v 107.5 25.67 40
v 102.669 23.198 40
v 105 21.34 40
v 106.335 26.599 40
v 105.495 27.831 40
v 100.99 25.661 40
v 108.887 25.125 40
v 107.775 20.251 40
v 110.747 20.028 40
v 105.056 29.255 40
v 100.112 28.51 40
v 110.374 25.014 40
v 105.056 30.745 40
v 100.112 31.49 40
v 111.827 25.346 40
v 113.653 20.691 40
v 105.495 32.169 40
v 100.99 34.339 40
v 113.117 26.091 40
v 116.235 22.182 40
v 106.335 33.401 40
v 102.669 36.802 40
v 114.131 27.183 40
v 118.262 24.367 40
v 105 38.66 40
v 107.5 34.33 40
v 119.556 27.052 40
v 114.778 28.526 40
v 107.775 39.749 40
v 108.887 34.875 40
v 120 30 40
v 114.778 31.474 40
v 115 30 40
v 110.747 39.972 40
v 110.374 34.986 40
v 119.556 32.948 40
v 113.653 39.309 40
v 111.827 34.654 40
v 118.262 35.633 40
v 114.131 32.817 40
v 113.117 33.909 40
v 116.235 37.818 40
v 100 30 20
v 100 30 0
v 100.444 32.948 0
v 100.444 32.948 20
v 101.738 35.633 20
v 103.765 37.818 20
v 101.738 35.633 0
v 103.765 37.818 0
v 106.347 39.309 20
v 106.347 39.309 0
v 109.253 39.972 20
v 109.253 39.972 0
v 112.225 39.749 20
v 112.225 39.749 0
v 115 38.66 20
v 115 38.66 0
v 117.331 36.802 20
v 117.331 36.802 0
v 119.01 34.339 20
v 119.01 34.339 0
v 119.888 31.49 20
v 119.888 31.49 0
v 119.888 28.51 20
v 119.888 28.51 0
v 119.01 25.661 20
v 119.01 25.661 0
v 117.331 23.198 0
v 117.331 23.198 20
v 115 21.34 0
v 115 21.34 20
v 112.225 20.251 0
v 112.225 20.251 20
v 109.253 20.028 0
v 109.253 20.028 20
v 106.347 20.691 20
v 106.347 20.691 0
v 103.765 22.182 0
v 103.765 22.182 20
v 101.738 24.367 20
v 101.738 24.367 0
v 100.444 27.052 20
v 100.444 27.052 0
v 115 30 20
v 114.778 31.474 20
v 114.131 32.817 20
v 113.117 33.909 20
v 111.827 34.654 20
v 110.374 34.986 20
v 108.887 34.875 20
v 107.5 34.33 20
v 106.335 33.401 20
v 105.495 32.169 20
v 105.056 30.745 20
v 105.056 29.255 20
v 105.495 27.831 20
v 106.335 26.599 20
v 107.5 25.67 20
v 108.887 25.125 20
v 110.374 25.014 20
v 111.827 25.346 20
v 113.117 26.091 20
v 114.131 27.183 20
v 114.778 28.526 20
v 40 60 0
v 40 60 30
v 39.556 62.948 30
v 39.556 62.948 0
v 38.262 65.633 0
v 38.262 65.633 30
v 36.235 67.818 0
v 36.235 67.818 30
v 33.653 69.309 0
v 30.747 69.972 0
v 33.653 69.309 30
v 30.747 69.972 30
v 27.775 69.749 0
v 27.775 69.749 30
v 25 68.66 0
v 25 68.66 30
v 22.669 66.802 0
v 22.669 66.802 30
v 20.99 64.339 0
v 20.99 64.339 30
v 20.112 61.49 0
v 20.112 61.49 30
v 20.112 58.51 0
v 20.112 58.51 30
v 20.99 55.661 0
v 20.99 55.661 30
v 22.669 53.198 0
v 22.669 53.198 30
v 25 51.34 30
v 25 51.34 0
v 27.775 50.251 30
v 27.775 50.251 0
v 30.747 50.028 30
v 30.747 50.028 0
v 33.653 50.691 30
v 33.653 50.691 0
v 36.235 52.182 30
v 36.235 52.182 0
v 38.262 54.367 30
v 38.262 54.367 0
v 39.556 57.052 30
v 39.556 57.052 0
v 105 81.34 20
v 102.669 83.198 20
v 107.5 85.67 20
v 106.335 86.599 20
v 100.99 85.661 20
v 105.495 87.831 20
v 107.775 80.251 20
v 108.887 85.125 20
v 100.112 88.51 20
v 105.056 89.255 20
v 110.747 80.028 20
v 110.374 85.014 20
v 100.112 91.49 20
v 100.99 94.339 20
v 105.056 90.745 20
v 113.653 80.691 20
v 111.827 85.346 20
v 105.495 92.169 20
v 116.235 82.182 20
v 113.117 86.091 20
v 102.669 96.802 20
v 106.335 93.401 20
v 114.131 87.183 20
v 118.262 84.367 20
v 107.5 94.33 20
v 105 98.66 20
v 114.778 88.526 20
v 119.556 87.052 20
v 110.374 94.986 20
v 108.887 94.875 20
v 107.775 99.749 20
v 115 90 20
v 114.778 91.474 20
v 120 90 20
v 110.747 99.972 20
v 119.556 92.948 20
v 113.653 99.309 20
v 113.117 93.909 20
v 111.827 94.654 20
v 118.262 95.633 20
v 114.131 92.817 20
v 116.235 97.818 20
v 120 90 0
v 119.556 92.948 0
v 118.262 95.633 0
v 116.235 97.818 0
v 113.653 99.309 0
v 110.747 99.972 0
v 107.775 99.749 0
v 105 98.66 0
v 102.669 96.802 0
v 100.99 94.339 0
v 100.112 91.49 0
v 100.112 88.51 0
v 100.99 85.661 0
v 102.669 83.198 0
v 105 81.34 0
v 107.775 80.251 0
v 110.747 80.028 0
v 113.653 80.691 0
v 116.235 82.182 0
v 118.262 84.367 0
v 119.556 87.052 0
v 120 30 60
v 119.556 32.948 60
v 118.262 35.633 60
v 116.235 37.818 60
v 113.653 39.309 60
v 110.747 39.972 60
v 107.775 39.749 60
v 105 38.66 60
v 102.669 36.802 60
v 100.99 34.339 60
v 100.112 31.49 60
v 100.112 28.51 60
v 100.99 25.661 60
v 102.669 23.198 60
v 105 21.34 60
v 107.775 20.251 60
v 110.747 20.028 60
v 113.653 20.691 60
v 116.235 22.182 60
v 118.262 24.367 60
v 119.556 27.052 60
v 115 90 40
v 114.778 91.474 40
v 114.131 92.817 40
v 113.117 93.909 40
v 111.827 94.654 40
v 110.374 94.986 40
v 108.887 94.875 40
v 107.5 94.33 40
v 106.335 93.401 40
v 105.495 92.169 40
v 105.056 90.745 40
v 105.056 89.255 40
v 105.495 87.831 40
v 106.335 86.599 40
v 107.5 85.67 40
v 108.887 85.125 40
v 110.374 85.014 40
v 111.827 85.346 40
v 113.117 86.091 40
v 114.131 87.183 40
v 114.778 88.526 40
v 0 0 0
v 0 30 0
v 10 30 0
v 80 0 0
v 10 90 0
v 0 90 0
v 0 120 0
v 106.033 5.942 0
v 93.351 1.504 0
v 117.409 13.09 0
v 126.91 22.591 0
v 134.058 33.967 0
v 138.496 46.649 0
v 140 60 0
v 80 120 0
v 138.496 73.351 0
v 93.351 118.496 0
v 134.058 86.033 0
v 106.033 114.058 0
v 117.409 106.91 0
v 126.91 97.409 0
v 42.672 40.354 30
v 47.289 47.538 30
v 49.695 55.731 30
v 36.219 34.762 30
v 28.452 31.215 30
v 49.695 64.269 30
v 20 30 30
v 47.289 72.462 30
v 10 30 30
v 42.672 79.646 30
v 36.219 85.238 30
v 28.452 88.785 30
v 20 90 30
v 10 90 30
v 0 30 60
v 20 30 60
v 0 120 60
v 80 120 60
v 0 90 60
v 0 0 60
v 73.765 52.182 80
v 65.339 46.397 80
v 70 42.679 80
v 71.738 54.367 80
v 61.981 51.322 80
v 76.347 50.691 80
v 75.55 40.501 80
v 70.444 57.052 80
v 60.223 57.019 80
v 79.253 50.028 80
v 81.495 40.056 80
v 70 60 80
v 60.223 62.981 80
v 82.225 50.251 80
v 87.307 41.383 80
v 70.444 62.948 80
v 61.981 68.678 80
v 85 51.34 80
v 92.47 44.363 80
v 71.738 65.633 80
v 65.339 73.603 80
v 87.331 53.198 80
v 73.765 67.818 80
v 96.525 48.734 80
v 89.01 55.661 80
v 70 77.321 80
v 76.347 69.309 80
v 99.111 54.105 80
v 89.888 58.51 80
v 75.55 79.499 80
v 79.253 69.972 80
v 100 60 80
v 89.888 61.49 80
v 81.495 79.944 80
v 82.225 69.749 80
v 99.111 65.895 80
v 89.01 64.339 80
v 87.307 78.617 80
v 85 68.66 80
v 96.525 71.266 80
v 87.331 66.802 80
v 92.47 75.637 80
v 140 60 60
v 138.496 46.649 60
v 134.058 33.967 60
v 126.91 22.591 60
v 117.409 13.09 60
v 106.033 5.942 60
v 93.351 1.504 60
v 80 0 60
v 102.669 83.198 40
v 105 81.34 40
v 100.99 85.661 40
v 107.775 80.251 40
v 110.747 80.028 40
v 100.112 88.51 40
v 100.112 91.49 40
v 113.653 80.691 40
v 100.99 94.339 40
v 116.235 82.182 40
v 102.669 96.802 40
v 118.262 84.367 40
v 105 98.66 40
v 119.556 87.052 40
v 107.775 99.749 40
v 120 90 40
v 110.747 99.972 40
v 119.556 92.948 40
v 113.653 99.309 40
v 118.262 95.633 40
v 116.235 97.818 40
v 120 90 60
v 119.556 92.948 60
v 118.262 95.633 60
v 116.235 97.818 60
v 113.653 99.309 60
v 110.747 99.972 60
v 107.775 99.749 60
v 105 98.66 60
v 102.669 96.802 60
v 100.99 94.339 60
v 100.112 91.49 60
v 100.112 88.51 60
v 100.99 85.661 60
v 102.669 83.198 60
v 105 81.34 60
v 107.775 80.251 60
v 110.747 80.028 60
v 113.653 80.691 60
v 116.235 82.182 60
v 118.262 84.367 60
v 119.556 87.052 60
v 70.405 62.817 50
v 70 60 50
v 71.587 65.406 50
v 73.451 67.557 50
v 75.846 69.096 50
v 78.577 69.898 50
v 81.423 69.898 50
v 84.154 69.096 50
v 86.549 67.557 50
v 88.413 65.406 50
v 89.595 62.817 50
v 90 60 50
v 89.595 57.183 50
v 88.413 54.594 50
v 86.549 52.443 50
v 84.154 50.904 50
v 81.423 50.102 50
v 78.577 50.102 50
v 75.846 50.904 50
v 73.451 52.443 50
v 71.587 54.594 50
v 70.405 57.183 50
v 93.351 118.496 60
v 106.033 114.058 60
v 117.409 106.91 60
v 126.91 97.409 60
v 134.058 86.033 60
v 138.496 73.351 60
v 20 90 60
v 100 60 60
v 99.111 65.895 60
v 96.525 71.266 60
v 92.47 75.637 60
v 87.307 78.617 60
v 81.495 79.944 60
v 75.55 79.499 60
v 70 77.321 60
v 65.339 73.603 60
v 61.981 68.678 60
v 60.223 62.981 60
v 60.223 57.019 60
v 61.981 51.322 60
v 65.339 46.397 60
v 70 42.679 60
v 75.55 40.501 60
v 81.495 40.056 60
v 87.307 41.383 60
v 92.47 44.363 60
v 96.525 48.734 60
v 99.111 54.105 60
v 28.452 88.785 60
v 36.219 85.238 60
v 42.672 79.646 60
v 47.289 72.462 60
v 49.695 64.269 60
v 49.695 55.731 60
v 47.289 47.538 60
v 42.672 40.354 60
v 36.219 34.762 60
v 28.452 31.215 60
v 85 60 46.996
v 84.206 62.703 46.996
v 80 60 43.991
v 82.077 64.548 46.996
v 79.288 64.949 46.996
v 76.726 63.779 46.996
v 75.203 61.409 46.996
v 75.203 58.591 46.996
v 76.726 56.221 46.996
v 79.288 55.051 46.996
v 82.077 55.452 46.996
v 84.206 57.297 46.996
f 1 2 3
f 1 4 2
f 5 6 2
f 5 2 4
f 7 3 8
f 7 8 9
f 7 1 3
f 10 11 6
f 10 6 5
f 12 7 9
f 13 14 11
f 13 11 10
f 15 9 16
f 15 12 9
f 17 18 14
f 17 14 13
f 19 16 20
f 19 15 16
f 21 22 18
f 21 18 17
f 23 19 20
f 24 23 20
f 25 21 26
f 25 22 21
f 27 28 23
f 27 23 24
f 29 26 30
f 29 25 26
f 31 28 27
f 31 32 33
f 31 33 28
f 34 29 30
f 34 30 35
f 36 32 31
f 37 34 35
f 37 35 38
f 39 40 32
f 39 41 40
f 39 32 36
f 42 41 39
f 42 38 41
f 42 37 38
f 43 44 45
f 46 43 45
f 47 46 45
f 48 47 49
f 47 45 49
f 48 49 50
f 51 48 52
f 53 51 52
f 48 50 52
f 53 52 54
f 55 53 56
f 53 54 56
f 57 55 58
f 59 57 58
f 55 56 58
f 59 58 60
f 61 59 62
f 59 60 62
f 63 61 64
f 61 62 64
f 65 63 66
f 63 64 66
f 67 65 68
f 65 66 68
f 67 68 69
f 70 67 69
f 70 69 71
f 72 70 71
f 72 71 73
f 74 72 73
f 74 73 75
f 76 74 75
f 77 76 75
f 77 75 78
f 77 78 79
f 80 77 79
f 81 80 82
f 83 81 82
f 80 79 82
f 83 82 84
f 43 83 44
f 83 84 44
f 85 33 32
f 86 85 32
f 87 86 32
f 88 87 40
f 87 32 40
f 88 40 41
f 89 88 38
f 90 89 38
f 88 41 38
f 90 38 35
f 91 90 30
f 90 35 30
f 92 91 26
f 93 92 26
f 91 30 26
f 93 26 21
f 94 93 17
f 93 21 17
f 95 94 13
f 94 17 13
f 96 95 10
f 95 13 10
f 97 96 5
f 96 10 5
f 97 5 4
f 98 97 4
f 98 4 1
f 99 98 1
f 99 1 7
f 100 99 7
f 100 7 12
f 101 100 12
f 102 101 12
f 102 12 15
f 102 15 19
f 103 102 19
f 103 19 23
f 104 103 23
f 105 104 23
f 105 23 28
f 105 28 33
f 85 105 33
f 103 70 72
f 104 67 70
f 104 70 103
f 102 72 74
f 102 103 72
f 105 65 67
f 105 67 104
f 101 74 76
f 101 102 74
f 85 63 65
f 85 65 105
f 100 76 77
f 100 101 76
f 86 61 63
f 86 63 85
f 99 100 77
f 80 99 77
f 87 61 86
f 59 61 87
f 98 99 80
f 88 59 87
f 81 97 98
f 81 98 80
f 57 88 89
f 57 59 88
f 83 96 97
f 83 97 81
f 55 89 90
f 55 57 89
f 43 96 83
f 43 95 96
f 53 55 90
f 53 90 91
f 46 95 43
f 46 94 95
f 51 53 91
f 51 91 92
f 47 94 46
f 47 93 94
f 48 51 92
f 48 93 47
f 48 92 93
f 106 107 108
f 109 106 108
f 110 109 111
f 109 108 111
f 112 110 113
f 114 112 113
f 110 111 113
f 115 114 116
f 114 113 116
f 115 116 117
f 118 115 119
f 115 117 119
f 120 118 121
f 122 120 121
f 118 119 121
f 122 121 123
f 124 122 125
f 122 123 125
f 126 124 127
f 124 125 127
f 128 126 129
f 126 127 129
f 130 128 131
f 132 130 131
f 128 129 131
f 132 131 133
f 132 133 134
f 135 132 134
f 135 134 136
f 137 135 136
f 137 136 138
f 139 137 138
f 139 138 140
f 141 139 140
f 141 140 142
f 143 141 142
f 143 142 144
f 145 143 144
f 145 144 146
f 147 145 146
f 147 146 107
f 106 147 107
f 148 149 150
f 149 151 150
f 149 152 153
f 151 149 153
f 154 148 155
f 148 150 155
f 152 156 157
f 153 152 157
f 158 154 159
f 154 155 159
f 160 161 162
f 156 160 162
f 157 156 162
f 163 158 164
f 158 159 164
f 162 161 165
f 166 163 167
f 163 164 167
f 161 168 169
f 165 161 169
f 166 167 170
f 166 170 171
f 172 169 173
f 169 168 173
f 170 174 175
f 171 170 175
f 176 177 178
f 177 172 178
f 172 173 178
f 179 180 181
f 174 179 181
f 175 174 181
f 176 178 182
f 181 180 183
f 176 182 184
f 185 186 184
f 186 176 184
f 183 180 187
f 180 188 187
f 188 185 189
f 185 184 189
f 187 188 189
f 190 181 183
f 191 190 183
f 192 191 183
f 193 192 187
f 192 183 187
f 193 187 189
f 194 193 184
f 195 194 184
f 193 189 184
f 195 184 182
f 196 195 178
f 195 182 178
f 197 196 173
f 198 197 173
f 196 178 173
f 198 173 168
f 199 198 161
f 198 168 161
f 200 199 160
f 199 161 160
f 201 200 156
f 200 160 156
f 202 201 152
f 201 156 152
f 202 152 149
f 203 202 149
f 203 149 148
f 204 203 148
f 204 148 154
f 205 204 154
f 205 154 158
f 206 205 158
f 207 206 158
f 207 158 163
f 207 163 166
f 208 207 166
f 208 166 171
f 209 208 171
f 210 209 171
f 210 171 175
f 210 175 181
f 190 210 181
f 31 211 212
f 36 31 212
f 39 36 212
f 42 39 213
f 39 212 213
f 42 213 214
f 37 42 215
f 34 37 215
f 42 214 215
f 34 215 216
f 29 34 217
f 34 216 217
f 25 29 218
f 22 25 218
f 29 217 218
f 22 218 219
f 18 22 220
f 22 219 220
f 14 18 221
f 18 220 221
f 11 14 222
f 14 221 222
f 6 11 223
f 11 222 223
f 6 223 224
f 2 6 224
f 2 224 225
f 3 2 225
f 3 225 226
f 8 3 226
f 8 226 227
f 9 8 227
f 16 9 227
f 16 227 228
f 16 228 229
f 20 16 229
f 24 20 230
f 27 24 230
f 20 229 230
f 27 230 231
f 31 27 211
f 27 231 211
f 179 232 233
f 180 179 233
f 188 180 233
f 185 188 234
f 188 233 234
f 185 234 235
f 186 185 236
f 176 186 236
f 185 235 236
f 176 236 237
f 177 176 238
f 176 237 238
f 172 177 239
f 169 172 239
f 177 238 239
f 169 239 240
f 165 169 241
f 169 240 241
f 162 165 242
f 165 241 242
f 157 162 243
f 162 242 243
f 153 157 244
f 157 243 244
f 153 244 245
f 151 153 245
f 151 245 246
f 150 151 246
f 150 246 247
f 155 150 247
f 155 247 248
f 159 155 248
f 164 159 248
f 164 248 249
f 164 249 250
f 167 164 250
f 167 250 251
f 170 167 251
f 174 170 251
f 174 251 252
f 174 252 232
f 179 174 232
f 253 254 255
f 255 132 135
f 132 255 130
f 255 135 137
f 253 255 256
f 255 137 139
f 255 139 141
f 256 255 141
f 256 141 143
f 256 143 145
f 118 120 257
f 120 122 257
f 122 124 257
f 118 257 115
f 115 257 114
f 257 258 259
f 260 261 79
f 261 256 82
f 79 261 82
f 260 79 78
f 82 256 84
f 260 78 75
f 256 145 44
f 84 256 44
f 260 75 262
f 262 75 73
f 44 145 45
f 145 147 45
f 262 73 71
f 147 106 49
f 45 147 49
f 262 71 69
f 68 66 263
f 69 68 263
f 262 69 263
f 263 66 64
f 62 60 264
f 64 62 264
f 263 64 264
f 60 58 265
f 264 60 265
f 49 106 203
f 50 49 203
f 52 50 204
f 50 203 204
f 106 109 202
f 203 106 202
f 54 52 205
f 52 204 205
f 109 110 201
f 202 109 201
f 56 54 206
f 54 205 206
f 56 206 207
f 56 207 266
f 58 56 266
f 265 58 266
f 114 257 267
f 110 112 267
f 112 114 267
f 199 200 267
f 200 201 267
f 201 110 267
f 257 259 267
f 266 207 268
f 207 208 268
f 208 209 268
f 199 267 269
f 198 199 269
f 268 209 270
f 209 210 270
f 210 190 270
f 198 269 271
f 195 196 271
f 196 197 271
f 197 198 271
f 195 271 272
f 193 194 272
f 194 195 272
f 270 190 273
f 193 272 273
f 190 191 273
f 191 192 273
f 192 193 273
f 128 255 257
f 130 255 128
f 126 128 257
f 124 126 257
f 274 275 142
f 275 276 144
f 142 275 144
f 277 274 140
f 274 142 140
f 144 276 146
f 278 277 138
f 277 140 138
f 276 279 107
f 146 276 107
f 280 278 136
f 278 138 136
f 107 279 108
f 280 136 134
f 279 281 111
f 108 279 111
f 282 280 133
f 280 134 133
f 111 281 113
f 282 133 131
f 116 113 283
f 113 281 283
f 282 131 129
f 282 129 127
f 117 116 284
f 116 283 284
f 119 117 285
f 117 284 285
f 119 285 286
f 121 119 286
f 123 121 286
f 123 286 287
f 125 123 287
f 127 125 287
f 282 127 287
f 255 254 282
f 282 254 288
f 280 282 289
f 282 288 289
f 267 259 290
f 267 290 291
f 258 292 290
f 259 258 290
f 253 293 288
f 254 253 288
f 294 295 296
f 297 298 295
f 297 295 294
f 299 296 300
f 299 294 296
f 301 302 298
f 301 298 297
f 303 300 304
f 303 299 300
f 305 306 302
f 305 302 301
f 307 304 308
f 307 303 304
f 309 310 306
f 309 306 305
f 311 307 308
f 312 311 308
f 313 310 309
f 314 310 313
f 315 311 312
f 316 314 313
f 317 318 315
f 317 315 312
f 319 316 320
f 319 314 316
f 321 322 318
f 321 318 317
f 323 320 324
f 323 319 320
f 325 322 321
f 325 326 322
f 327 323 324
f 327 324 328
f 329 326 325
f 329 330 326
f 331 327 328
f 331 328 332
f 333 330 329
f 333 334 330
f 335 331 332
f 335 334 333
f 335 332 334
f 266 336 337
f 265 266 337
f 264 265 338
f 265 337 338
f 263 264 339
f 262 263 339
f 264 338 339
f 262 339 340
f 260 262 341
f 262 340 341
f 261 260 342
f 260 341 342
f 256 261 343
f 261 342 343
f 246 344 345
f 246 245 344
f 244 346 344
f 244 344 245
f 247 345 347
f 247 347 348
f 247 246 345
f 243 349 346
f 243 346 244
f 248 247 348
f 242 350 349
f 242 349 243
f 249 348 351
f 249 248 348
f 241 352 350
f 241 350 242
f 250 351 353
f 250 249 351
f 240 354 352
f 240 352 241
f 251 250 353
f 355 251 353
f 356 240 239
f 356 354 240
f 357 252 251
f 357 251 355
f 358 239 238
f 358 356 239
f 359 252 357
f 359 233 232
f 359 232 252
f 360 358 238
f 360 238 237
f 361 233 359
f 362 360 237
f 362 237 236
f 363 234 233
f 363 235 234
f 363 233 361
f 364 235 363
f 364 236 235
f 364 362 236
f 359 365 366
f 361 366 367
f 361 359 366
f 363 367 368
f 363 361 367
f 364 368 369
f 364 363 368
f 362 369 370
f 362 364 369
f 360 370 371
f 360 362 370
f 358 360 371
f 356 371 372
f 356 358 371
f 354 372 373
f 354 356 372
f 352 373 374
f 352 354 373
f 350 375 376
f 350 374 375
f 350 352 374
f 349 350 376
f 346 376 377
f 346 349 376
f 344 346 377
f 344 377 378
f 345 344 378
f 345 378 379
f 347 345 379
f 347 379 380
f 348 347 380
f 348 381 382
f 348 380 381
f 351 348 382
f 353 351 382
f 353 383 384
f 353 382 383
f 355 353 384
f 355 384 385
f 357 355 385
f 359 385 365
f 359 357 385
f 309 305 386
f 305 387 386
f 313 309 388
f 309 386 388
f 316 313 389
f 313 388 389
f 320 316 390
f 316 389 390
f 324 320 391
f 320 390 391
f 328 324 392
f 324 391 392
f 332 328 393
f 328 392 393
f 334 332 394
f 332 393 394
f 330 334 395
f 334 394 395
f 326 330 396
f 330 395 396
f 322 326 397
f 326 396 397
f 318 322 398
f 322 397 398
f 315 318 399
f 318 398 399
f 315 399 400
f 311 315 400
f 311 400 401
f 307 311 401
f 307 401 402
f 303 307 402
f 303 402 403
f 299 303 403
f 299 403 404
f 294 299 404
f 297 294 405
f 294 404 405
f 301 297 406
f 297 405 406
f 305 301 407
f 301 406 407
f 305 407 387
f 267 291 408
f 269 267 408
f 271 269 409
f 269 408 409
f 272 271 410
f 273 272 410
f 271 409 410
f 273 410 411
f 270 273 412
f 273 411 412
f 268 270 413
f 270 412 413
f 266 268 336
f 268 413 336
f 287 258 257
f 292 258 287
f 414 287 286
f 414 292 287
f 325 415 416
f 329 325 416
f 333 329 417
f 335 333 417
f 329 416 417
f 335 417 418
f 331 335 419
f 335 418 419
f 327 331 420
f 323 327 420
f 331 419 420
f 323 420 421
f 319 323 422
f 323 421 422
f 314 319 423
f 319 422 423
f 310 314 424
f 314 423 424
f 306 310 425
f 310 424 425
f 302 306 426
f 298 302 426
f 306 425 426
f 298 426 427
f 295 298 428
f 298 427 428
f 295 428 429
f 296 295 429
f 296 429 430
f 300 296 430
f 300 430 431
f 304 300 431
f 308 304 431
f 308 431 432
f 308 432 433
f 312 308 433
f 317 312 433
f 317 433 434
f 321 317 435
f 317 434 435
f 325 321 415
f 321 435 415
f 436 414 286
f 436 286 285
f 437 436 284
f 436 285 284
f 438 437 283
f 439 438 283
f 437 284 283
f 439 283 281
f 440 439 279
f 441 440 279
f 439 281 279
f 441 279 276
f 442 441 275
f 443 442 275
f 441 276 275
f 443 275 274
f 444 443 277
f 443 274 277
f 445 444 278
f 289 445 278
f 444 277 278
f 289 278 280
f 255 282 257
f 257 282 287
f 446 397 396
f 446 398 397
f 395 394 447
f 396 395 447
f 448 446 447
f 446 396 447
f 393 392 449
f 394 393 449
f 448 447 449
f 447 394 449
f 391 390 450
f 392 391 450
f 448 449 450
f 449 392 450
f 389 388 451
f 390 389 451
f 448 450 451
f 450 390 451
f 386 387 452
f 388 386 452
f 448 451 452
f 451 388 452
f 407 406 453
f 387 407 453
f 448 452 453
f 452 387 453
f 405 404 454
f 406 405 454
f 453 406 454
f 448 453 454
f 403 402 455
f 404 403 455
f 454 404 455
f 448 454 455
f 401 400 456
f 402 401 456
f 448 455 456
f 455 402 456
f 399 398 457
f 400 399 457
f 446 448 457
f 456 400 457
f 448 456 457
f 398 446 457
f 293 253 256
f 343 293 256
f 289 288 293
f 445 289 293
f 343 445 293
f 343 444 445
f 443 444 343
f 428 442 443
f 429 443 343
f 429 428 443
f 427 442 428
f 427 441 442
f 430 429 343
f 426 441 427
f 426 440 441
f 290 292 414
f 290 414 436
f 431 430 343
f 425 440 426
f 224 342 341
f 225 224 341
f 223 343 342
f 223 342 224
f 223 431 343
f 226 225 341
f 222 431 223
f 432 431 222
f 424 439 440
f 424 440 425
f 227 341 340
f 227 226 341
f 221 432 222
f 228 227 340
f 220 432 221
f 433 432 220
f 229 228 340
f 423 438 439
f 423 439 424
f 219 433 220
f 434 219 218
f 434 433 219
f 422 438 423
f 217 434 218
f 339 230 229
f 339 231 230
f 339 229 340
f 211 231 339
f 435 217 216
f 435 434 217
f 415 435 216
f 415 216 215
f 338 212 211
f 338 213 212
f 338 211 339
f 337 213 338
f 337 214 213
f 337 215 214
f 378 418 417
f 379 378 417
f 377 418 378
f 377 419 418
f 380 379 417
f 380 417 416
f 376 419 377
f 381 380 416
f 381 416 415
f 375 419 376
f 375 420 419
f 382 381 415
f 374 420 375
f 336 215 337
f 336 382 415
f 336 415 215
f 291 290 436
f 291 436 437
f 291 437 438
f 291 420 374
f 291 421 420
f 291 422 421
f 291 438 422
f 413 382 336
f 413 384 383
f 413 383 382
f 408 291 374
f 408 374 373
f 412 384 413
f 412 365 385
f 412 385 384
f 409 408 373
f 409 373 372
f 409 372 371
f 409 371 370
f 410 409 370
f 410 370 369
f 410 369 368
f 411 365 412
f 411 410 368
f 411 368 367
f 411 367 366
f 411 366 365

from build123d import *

# Parameters (mm, degrees)
SKETCH1_W                  = 140
SKETCH1_H                  = 120
BOSS_EXTRUDE1_DEPTH        = 60
SKETCH2_W                  = 10
SKETCH2_H                  = 60
CUT_EXTRUDE1_DEPTH         = 60
CUT_EXTRUDE2_DEPTH         = 60
SKETCH4_R                  = 10
CUT_EXTRUDE3_DEPTH         = 60
SKETCH5_R                  = 10
CUT_EXTRUDE4_DEPTH         = 60
SKETCH6_R                  = 10
CUT_EXTRUDE5_DEPTH         = 60
SKETCH7_R                  = 5
CUT_EXTRUDE6_DEPTH         = 60
SKETCH8_R                  = 10
CUT_EXTRUDE7_DEPTH         = 20
SKETCH9_R                  = 5
CUT_EXTRUDE8_DEPTH         = 47
SKETCH10_R                 = 10
CUT_EXTRUDE9_DEPTH         = 20
SKETCH11_R                 = 20
BOSS_EXTRUDE2_DEPTH        = 20
F_20_0MM_DOWEL_HOLE1_D     = 20
F_20_0MM_DOWEL_HOLE1_DEPTH = 30
F_20_0MM_DOWEL_HOLE1_TIP   = 6.00860619


with BuildPart() as part:
    # Sketch1 → Boss-Extrude1 (new body)
    with BuildSketch(Plane.XY):
        with Locations((70, 60)):
            Rectangle(SKETCH1_W, SKETCH1_H)
    extrude(amount=BOSS_EXTRUDE1_DEPTH)

    # Sketch2 → Cut-Extrude1 (cut)
    with BuildSketch(Plane.XY.offset(60)):
        with BuildLine():
            Line((140, 120), (80, 120))
            ThreePointArc((80, 120), (122.426406871, 102.426406871), (140, 60))
            Line((140, 60), (140, 120))
        make_face()
        with BuildLine():
            Line((140, 0), (140, 60))
            ThreePointArc((140, 60), (122.426406871, 17.573593129), (80, 0))
            Line((80, 0), (140, 0))
        make_face()
        with Locations((5, 60)):
            Rectangle(SKETCH2_W, SKETCH2_H)
    extrude(amount=-CUT_EXTRUDE1_DEPTH, mode=Mode.SUBTRACT)

    # Sketch3 → Cut-Extrude2 (cut)
    with BuildSketch(Plane.XY.offset(30)):
        with BuildLine():
            ThreePointArc((20, 90), (50, 60), (20, 30))
            Line((20, 30), (10, 30))
            Line((10, 30), (10, 90))
            Line((10, 90), (20, 90))
        make_face()
    extrude(amount=CUT_EXTRUDE2_DEPTH, mode=Mode.SUBTRACT)

    # Sketch4 → Cut-Extrude3 (cut)
    with BuildSketch(Plane.XY.offset(30)):
        with Locations((30, 60)):
            Circle(SKETCH4_R)
    extrude(amount=-CUT_EXTRUDE3_DEPTH, mode=Mode.SUBTRACT)

    # Sketch5 → Cut-Extrude4 (cut)
    with BuildSketch(Plane.XY.offset(20)):
        with Locations((110, 90)):
            Circle(SKETCH5_R)
    extrude(amount=-CUT_EXTRUDE4_DEPTH, mode=Mode.SUBTRACT)

    # Sketch6 → Cut-Extrude5 (cut)
    with BuildSketch(Plane.XY.offset(40)):
        with Locations((110, 90)):
            Circle(SKETCH6_R)
    extrude(amount=CUT_EXTRUDE5_DEPTH, mode=Mode.SUBTRACT)

    # Sketch7 → Cut-Extrude6 (cut)
    with BuildSketch(Plane.XY.offset(40)):
        with Locations((110, 90)):
            Circle(SKETCH7_R)
    extrude(amount=-CUT_EXTRUDE6_DEPTH, mode=Mode.SUBTRACT)

    # Sketch8 → Cut-Extrude7 (cut)
    with BuildSketch(Plane.XY.offset(60)):
        with Locations((110, 30)):
            Circle(SKETCH8_R)
    extrude(amount=-CUT_EXTRUDE7_DEPTH, mode=Mode.SUBTRACT)

    # Sketch9 → Cut-Extrude8 (cut)
    with BuildSketch(Plane.XY.offset(40)):
        with Locations((110, 30)):
            Circle(SKETCH9_R)
    extrude(amount=-CUT_EXTRUDE8_DEPTH, mode=Mode.SUBTRACT)

    # Sketch10 → Cut-Extrude9 (cut)
    with BuildSketch(Plane(origin=(0, 0, 0), x_dir=(-1, 0, 0), z_dir=(0, 0, -1))):
        with Locations((-110, 30)):
            Circle(SKETCH10_R)
    extrude(amount=-CUT_EXTRUDE9_DEPTH, mode=Mode.SUBTRACT)

    # Sketch11 → Boss-Extrude2 (add)
    with BuildSketch(Plane.XY.offset(60)):
        with Locations((80, 60)):
            Circle(SKETCH11_R)
    extrude(amount=BOSS_EXTRUDE2_DEPTH)

    # Ø20.0mm Dowel Hole1
    with Locations(Plane(origin=(80, 60, 80), x_dir=(1, 0, 0), z_dir=(0, 0, 1))):
        with Locations((0, 0)):
            Hole(F_20_0MM_DOWEL_HOLE1_D / 2, depth=F_20_0MM_DOWEL_HOLE1_DEPTH)
            with Locations((0, 0, -(F_20_0MM_DOWEL_HOLE1_DEPTH + F_20_0MM_DOWEL_HOLE1_TIP / 2))):  # 118° drill point
                Cone(0, F_20_0MM_DOWEL_HOLE1_D / 2, F_20_0MM_DOWEL_HOLE1_TIP, mode=Mode.SUBTRACT)


solid = part.part
